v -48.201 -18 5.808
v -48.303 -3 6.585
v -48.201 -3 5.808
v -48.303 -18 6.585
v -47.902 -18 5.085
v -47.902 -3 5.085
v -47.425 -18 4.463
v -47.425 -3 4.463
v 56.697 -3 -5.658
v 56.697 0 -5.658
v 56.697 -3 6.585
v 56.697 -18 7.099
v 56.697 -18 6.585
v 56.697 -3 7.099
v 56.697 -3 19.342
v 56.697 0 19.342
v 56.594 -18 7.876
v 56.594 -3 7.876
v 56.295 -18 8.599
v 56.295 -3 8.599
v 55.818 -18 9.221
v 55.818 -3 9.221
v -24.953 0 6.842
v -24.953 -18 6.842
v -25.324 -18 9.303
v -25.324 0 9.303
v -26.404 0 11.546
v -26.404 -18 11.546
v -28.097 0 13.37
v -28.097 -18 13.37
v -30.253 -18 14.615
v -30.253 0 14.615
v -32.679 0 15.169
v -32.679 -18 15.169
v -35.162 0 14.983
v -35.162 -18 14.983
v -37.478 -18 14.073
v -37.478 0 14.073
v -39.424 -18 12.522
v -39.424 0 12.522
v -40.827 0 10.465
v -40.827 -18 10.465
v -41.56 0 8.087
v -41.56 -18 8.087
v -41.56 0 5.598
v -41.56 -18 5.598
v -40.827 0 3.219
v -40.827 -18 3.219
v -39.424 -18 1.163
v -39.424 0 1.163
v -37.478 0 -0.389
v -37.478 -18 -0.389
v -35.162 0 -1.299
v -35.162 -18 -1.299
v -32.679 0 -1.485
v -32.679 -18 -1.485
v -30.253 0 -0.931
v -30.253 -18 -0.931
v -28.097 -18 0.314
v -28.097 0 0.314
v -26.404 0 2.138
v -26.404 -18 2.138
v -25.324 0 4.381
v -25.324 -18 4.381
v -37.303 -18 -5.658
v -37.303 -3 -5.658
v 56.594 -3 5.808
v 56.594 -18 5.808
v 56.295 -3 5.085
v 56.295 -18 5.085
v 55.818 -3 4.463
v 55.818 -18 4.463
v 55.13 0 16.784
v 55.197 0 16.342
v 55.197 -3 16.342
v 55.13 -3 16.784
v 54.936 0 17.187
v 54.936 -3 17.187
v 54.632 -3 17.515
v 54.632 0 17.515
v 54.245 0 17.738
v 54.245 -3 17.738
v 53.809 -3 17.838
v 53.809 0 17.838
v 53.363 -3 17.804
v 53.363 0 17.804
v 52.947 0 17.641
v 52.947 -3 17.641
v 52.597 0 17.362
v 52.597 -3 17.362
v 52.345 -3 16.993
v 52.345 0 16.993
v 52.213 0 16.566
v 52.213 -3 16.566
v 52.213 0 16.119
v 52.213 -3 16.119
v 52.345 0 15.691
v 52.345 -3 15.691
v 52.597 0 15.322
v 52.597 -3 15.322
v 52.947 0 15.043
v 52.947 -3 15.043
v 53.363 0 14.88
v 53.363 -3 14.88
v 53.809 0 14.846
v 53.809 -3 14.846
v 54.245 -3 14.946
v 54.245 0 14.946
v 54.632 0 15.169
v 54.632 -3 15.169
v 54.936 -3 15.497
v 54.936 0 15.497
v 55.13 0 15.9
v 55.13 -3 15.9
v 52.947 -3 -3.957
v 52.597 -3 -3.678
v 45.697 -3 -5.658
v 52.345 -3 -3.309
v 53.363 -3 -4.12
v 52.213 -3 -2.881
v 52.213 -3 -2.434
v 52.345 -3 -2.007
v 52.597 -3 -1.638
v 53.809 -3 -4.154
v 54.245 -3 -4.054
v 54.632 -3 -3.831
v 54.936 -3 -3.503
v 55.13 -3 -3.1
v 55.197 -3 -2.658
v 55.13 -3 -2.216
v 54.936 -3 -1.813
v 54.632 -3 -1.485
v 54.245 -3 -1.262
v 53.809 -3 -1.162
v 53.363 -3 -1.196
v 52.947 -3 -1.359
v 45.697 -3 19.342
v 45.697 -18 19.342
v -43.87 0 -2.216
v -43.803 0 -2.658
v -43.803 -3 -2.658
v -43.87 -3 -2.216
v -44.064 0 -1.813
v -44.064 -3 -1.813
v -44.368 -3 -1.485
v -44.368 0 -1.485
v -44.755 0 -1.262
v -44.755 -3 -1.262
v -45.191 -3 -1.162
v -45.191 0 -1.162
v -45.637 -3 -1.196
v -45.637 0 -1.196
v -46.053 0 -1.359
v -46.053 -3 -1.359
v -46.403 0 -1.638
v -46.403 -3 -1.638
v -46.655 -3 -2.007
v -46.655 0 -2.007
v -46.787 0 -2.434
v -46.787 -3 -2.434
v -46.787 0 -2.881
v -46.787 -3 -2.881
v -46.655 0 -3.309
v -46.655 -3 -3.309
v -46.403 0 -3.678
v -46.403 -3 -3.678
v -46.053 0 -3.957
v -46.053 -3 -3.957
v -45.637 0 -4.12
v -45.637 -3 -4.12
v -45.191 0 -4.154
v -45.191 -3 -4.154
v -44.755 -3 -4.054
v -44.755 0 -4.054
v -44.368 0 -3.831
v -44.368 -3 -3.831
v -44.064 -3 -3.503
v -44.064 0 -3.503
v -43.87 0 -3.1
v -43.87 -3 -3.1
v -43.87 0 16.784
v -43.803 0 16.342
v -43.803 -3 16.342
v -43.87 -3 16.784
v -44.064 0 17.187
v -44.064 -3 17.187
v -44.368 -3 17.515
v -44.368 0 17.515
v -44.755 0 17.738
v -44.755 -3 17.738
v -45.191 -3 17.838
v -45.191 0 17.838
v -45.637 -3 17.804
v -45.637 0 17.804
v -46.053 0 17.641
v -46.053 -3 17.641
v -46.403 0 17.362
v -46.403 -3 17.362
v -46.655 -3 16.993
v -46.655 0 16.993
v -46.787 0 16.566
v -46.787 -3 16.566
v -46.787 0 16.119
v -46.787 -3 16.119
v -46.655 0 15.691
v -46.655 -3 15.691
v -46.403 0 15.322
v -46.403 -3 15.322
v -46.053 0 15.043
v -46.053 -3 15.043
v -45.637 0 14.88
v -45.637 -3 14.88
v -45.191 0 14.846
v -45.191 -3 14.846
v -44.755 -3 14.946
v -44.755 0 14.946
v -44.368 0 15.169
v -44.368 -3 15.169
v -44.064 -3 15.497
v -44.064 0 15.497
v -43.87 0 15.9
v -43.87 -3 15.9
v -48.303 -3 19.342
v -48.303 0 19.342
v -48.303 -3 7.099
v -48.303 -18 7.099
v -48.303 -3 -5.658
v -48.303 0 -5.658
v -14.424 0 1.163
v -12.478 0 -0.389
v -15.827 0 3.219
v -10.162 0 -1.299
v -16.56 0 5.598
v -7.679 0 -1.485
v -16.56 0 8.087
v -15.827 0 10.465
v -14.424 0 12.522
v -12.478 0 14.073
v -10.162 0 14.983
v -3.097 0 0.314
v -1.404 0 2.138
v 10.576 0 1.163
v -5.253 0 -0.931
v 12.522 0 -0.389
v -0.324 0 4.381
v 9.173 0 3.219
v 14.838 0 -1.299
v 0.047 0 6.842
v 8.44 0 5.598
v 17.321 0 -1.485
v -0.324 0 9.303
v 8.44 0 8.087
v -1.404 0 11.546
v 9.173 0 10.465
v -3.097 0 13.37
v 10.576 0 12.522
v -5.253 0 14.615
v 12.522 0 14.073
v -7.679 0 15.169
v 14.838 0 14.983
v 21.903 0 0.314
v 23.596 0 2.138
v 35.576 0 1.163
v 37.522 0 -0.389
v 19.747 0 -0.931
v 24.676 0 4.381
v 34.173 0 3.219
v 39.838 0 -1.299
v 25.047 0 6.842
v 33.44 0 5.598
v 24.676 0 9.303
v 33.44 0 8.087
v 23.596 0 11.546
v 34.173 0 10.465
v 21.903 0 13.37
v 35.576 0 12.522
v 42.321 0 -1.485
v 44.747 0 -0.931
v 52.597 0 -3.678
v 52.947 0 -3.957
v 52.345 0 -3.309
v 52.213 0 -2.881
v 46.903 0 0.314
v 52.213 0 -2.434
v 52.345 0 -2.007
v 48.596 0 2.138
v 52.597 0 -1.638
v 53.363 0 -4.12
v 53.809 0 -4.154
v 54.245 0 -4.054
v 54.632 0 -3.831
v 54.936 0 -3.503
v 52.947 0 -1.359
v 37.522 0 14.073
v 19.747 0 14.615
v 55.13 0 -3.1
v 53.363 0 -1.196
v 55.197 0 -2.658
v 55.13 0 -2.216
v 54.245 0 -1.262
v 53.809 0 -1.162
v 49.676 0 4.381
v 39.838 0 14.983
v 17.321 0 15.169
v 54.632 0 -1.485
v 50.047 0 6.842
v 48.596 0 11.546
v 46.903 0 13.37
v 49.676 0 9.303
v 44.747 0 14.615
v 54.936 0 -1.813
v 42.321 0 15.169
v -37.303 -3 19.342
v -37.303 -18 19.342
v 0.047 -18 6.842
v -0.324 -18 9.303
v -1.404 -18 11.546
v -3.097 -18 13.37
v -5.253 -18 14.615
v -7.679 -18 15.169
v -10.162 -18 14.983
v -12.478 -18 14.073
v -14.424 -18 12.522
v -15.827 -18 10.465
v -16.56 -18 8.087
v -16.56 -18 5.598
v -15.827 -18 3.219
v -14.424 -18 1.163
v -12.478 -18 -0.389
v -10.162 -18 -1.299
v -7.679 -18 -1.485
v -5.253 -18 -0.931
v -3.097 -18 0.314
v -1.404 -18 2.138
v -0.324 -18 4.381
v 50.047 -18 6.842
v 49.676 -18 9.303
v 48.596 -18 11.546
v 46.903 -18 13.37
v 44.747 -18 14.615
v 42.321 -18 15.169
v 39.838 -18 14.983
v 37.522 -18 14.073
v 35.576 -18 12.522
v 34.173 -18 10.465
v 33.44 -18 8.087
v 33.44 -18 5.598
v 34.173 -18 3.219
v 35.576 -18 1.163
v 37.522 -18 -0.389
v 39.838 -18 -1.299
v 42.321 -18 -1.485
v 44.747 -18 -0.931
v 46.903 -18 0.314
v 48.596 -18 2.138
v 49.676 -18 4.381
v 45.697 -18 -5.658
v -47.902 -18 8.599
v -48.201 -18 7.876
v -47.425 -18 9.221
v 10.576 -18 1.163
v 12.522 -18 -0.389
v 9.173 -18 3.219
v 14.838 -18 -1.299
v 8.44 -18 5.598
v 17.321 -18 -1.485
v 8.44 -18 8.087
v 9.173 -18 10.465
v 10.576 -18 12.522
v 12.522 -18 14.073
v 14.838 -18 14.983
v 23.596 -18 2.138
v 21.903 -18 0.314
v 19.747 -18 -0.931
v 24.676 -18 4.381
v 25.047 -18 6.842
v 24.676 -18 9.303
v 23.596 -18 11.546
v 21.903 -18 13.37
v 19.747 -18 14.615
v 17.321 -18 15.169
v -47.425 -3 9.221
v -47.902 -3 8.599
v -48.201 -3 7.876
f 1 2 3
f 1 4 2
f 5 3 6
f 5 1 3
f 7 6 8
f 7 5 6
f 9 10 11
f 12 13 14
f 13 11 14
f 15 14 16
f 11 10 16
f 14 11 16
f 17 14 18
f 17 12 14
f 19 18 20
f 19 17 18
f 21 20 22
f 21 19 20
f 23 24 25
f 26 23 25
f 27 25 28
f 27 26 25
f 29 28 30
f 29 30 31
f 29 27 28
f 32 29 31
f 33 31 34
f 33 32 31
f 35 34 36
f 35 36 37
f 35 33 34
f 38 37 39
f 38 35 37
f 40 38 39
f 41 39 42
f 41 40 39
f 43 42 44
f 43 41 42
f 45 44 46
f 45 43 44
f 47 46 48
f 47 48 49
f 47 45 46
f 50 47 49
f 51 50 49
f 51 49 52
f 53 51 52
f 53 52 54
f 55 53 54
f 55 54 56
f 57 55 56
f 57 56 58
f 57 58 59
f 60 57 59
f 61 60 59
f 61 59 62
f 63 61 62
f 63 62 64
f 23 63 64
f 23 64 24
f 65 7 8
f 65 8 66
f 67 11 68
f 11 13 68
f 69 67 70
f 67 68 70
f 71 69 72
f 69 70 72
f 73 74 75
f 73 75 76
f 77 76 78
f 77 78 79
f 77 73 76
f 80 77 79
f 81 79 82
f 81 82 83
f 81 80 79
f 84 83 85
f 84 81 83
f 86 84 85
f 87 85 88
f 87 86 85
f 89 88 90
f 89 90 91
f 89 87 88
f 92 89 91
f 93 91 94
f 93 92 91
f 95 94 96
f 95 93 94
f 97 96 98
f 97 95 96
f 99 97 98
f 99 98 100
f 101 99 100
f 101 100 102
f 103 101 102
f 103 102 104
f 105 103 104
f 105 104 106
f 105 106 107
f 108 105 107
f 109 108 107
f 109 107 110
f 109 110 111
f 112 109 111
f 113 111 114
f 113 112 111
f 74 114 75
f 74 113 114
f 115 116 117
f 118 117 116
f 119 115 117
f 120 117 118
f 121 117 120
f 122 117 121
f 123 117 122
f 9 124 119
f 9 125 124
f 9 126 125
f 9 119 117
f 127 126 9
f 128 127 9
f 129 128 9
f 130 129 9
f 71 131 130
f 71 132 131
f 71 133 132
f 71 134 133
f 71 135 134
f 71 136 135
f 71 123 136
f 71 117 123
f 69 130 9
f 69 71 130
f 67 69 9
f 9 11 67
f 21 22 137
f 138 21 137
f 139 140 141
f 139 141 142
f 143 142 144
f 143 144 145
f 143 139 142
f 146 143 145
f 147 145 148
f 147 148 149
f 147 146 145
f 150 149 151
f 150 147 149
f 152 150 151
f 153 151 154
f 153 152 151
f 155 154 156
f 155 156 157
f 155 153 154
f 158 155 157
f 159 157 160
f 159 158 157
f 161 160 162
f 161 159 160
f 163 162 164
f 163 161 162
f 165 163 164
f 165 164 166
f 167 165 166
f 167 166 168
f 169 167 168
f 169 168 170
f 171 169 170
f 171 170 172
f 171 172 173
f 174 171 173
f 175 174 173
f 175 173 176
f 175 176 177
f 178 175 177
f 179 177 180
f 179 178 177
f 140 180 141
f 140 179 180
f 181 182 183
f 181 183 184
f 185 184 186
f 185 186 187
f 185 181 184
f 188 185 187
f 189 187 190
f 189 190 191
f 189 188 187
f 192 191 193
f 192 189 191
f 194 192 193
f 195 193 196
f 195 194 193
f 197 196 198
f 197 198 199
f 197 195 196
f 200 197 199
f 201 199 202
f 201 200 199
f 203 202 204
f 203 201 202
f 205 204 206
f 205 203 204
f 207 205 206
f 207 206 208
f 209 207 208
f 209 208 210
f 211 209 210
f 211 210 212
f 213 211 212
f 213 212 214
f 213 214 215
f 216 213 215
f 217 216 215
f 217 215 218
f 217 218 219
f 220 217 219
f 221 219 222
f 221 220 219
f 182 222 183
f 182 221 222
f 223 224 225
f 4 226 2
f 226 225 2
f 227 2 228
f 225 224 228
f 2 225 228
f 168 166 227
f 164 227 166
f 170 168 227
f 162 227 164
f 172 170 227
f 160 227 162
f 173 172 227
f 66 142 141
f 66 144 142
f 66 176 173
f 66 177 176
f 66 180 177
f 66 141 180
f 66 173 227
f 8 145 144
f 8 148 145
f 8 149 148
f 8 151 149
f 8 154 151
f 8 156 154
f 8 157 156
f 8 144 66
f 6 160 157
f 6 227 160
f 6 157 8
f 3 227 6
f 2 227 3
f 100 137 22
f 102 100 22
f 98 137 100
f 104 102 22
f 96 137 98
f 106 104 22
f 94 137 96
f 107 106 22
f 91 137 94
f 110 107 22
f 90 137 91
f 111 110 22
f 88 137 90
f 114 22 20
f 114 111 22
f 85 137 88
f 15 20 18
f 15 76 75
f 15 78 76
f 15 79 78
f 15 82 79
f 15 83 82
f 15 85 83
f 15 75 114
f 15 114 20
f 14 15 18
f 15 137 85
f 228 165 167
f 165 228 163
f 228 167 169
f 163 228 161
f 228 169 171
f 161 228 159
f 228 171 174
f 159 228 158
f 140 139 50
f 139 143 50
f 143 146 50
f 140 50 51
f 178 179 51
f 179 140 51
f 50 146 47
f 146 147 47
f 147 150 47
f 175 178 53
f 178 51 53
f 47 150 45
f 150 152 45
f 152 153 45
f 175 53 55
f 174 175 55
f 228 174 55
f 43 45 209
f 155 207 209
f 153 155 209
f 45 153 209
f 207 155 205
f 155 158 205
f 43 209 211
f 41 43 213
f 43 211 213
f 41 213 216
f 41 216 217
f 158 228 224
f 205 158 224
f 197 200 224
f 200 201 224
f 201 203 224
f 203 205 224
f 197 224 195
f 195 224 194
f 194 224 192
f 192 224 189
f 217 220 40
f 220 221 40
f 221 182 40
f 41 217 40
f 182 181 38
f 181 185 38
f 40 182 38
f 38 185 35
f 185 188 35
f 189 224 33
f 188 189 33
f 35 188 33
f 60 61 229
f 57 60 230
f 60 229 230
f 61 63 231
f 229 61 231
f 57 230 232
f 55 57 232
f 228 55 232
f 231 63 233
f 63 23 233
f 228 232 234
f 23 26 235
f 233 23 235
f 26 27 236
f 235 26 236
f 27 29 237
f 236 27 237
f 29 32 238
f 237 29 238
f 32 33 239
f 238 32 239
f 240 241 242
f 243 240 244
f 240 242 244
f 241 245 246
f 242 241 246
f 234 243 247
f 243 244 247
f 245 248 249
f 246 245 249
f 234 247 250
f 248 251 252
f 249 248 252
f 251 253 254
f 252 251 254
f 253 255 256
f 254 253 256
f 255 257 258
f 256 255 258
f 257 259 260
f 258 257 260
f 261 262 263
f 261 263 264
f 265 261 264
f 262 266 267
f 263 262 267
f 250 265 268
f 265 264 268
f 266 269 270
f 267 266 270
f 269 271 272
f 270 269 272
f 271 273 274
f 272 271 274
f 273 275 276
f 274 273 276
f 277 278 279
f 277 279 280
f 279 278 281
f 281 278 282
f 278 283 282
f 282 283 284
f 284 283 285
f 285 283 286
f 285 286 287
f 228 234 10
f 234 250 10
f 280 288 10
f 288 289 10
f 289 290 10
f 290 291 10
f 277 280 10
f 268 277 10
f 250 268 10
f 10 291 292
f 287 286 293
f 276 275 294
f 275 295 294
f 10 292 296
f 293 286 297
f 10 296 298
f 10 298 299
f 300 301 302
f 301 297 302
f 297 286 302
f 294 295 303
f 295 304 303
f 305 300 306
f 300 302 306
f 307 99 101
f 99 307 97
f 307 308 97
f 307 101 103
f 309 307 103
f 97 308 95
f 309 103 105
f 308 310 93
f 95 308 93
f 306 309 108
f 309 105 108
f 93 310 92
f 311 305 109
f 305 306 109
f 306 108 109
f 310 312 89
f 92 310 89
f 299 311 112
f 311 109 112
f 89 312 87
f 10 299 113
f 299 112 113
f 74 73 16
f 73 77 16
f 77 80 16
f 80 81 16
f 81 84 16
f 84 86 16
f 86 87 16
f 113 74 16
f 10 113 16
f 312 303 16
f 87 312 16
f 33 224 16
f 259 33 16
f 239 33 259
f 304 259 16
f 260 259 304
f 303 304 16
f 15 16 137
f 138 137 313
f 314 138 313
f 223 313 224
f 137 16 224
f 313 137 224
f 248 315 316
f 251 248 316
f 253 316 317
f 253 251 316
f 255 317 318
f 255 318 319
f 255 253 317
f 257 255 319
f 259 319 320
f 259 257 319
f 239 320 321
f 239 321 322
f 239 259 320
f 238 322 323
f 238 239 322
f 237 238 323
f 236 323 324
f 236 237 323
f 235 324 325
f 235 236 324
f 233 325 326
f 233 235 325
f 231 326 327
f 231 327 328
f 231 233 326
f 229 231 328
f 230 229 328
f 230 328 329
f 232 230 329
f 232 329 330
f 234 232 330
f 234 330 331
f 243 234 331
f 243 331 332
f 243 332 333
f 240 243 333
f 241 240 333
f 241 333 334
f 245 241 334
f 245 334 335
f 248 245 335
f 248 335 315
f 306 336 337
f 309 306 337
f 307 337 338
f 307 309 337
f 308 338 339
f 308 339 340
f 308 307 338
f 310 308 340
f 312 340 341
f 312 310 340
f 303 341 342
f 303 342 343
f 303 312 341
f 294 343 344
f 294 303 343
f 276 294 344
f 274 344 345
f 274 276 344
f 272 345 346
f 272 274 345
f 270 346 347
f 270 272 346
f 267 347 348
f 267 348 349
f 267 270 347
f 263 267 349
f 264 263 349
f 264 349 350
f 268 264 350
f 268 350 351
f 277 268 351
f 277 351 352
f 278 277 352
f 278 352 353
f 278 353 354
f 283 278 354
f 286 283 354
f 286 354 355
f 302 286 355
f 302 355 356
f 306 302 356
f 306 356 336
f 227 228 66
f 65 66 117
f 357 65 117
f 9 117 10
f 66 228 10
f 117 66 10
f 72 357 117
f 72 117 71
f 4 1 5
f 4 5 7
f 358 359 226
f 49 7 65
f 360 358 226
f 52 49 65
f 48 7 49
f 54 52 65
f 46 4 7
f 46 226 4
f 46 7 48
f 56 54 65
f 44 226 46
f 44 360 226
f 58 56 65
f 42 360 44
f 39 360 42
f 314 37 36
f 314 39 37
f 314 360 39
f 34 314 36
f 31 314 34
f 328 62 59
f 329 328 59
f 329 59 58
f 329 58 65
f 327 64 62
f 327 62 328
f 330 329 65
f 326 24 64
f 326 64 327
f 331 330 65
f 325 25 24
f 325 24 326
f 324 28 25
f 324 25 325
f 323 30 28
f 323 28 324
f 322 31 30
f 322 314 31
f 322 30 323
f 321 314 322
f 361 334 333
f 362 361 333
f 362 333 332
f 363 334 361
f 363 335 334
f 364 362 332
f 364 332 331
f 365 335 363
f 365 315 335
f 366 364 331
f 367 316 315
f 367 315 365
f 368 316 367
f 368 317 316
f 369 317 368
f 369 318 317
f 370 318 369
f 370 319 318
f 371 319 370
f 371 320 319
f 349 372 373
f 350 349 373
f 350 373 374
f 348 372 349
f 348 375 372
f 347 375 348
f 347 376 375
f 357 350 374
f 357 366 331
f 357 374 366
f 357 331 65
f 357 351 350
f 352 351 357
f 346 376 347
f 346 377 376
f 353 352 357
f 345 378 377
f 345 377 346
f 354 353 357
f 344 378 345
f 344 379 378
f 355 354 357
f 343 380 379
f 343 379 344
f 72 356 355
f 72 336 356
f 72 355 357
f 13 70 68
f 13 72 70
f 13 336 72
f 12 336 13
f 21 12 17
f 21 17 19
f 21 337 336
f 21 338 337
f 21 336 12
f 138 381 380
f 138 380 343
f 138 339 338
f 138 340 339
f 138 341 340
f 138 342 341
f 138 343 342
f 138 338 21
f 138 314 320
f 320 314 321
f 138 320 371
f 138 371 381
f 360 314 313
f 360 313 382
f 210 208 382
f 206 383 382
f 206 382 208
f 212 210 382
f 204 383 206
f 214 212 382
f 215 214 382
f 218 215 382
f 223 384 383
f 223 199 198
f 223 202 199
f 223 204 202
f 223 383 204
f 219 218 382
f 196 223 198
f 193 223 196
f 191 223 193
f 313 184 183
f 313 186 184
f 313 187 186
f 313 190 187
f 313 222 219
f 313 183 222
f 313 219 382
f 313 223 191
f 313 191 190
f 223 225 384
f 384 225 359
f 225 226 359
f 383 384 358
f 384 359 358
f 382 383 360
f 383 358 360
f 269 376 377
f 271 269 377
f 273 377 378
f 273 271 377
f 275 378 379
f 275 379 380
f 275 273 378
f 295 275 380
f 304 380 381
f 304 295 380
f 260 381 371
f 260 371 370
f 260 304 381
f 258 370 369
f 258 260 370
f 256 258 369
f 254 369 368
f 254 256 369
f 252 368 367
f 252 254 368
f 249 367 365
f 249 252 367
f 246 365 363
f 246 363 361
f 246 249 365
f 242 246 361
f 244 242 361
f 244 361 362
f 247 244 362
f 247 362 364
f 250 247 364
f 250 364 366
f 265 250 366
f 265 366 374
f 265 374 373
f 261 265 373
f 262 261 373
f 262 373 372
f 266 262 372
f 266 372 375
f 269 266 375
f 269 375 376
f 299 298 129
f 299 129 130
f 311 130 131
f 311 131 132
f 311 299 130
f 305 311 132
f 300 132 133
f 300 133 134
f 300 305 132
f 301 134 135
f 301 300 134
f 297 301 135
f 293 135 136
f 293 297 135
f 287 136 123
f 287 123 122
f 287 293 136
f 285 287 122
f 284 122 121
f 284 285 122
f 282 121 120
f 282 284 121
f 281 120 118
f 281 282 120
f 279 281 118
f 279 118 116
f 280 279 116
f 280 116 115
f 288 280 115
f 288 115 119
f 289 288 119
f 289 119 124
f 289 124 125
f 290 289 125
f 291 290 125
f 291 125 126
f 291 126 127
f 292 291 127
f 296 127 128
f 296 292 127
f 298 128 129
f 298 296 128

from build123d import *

# Parameters (mm, degrees)
F0_R     = 1.5
F0_R_2   = 8.35
F1_DEPTH = 3
F2_DEPTH = 18
F3_R     = 3


with BuildPart() as f1:
    # F0 (on Front) → F1 (new body)
    with BuildSketch(Plane.XZ):
        Polygon((-48.303484, 19.342105), (-48.303484, 8.342105), (-37.303484, 19.342105), align=None)
        with Locations((-45.303484, 16.342105)):
            Circle(F0_R, mode=Mode.SUBTRACT)
        Polygon((-48.303484, 5.342105), (-48.303484, -5.657895), (-37.303484, -5.657895), align=None)
        with Locations((-45.303484, -2.657895)):
            Circle(F0_R, mode=Mode.SUBTRACT)
        Polygon((-48.303484, 5.342105), (-37.303484, -5.657895), (45.696516, -5.657895), (56.696516, 5.342105), (56.696516, 6.842105), (56.696516, 8.342105), (45.696516, 19.342105), (-37.303484, 19.342105), (-48.303484, 8.342105), (-48.303484, 6.842105), align=None)
        with Locations((-33.303484, 6.842105)):
            Circle(F0_R_2, mode=Mode.SUBTRACT)
        with Locations((-8.303484, 6.842105)):
            Circle(F0_R_2, mode=Mode.SUBTRACT)
        with Locations((16.696516, 6.842105)):
            Circle(F0_R_2, mode=Mode.SUBTRACT)
        with Locations((41.696516, 6.842105)):
            Circle(F0_R_2, mode=Mode.SUBTRACT)
        Polygon((45.696516, 19.342105), (56.696516, 8.342105), (56.696516, 19.342105), align=None)
        with Locations((53.696516, 16.342105)):
            Circle(F0_R, mode=Mode.SUBTRACT)
        Polygon((56.696516, 5.342105), (45.696516, -5.657895), (56.696516, -5.657895), align=None)
        with Locations((53.696516, -2.657895)):
            Circle(F0_R, mode=Mode.SUBTRACT)
    extrude(amount=F1_DEPTH)

    # F0 (on Front) → F2 (join)
    with BuildSketch(Plane.XZ):
        Polygon((-48.303484, 5.342105), (-37.303484, -5.657895), (45.696516, -5.657895), (56.696516, 5.342105), (56.696516, 6.842105), (56.696516, 8.342105), (45.696516, 19.342105), (-37.303484, 19.342105), (-48.303484, 8.342105), (-48.303484, 6.842105), align=None)
        with Locations((-33.303484, 6.842105)):
            Circle(F0_R_2, mode=Mode.SUBTRACT)
        with Locations((-8.303484, 6.842105)):
            Circle(F0_R_2, mode=Mode.SUBTRACT)
        with Locations((16.696516, 6.842105)):
            Circle(F0_R_2, mode=Mode.SUBTRACT)
        with Locations((41.696516, 6.842105)):
            Circle(F0_R_2, mode=Mode.SUBTRACT)
    extrude(amount=F2_DEPTH)

    # F3
    f3_edges = [f1.edges().sort_by_distance(p)[0] for p in [
        (-48.303484, -10.5, 8.342105),
        (-48.303484, -10.5, 5.342105),
        (56.696516, -10.5, 5.342105),
        (56.696516, -10.5, 8.342105),
    ]]
    fillet(f3_edges, radius=F3_R)


solid = f1.part
